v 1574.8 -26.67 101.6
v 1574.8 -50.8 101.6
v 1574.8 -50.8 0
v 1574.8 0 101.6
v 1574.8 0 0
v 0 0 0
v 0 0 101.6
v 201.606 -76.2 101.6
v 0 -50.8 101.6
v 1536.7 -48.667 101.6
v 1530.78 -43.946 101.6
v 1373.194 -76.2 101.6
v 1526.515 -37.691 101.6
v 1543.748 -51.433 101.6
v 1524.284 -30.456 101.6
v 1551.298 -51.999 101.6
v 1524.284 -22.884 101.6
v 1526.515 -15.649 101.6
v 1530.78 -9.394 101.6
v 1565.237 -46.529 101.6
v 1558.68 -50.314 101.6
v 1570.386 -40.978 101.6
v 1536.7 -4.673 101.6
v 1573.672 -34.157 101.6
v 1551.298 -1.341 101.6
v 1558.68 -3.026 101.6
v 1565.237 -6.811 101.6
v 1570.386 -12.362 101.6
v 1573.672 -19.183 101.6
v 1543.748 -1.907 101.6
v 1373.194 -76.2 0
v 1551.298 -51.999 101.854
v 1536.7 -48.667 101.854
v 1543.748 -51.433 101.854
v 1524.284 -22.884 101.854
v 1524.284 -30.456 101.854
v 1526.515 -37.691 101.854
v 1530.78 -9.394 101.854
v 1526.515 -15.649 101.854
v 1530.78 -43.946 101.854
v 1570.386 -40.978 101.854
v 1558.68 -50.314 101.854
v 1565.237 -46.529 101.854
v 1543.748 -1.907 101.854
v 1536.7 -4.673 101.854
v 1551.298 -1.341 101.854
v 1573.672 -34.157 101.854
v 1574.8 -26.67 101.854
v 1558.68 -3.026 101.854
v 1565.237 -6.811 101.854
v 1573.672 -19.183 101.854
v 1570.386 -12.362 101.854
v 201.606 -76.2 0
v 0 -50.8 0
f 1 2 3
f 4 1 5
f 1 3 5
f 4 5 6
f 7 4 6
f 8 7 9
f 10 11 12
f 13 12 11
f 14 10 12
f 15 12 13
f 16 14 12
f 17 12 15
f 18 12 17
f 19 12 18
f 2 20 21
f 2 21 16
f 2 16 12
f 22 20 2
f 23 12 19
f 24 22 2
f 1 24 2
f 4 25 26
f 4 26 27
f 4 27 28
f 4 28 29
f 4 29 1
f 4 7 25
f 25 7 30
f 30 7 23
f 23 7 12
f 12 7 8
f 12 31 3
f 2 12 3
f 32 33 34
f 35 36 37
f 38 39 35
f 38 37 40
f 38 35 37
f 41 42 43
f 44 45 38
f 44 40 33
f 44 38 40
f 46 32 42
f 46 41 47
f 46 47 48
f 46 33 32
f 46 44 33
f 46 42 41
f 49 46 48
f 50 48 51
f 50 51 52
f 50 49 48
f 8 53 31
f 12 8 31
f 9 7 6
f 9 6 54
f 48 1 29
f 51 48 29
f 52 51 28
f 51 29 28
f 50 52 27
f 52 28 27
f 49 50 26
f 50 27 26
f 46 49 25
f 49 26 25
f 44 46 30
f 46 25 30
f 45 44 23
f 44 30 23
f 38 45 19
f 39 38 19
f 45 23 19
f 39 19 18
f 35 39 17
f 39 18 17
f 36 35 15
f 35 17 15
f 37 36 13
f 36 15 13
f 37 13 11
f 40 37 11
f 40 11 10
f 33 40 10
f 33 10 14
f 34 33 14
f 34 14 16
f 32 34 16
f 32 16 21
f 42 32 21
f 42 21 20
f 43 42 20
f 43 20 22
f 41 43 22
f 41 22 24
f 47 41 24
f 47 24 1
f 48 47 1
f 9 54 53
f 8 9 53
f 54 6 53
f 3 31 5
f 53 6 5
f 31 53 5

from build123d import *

# Parameters (mm, degrees)
F0_R     = 25.4
F1_DEPTH = 101.6
F2_DEPTH = 101.854


with BuildPart() as f1:
    # F0 (on Top) → F1 (new body)
    with BuildSketch(Plane.XY):
        Polygon((1574.8, 0), (0, 0), (0, -50.8), (201.6062499031, -76.2), (1373.1937500969, -76.2), (1574.8, -50.8), (1574.8, -26.67), align=None)
        with Locations((1549.4, -26.67)):
            Circle(F0_R, mode=Mode.SUBTRACT)
        with Locations((1549.4, -26.67)):
            Circle(F0_R)
    extrude(amount=F1_DEPTH)

    # F0 (on Top) → F2 (join)
    with BuildSketch(Plane.XY):
        with Locations((1549.4, -26.67)):
            Circle(F0_R)
    extrude(amount=F2_DEPTH)


solid = f1.part
